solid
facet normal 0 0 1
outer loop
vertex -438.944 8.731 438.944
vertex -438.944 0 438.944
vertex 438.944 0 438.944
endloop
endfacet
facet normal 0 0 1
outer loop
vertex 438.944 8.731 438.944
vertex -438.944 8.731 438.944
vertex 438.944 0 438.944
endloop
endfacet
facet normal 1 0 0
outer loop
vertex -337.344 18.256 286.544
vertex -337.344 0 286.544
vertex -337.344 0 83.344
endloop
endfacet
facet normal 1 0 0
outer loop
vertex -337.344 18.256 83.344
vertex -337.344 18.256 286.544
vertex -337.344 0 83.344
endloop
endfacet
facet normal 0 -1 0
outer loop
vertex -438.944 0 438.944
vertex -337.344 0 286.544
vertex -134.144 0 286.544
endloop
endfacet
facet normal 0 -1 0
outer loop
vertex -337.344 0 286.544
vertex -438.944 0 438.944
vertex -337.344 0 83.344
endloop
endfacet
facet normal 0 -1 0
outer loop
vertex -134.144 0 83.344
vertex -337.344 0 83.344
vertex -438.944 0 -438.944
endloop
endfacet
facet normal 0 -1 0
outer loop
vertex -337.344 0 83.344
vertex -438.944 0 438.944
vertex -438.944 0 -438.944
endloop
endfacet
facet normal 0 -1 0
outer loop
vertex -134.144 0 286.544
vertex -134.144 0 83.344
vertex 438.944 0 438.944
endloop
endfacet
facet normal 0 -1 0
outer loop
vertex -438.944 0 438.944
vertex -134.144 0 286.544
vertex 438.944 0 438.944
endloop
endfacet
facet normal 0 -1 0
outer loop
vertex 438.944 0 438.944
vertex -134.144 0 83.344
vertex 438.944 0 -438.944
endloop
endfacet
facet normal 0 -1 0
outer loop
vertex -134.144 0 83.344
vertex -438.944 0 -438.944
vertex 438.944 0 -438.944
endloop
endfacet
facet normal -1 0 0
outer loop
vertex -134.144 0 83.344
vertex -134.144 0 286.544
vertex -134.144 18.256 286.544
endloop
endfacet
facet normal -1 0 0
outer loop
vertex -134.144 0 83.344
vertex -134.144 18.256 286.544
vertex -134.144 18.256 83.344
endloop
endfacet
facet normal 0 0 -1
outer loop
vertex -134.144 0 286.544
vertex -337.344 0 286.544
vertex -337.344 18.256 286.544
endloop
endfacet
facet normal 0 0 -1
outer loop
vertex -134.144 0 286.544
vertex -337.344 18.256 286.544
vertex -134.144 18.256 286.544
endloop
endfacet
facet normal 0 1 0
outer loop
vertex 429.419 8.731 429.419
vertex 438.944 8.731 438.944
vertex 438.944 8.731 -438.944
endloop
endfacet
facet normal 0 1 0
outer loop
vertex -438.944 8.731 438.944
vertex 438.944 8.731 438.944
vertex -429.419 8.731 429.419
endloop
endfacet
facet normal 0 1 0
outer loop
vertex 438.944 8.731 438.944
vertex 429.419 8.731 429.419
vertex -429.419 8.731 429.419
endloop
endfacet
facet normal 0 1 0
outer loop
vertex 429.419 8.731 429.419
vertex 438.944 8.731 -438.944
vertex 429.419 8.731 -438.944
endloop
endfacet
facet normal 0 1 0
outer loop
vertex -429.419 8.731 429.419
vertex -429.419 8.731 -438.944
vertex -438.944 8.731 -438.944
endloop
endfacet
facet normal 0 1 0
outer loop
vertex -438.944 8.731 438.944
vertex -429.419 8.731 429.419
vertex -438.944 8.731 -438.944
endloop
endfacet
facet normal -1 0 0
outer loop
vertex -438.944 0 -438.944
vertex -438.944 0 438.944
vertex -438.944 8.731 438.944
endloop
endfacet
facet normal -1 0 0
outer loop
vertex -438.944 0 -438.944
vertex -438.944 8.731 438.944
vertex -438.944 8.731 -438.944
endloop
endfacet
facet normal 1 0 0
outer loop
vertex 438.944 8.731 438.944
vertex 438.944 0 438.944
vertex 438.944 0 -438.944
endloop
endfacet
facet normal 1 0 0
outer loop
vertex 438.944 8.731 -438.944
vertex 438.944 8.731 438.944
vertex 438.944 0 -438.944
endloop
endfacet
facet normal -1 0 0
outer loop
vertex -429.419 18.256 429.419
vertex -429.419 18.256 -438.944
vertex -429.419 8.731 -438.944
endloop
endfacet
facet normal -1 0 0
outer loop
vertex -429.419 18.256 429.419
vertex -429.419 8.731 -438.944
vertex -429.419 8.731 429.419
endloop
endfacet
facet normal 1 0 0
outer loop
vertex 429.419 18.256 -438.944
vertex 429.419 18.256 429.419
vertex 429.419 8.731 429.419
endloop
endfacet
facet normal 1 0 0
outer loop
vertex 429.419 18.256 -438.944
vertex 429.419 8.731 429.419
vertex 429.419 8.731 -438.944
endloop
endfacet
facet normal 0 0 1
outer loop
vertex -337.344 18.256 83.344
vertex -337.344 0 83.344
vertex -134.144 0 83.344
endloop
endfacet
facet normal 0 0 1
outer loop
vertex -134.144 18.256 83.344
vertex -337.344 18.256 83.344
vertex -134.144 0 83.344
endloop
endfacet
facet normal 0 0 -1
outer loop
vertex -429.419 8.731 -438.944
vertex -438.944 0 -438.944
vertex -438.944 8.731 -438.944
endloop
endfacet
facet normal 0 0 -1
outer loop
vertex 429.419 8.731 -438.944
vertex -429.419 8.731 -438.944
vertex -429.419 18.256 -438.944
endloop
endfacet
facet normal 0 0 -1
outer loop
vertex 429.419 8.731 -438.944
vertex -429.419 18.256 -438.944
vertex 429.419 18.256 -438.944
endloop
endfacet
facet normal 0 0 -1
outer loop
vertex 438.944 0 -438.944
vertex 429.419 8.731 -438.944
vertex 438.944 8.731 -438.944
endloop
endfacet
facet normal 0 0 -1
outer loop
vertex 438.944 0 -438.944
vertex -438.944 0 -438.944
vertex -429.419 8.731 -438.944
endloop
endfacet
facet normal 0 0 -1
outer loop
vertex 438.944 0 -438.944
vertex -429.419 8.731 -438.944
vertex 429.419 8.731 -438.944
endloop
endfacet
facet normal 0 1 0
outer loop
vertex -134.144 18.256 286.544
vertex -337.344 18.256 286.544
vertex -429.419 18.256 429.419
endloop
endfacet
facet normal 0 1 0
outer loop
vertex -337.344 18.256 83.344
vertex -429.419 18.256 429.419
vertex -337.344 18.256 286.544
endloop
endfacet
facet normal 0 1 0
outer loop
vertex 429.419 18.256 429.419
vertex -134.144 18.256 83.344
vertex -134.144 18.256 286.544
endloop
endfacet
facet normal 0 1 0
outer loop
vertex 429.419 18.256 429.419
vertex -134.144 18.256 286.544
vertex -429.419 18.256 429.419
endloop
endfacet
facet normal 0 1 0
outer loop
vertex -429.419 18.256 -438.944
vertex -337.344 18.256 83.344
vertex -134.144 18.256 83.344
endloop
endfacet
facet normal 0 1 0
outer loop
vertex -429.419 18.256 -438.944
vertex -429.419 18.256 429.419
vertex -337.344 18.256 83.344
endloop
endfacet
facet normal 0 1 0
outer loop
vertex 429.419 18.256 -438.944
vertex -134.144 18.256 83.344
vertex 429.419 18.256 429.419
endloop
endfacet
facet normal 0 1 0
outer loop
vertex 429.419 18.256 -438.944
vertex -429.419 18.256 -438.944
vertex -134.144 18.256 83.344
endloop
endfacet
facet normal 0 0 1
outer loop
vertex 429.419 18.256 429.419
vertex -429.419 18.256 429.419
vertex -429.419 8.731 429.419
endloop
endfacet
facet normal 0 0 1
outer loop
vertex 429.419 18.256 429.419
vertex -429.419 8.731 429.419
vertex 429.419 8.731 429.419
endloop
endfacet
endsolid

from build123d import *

# Parameters (mm, degrees)
SKETCH1_W           = 877.8875
SKETCH1_H           = 877.8875
SKETCH1_W_2         = 203.2
SKETCH1_H_2         = 203.2
BOSS_EXTRUDE1_DEPTH = 18.25625
CUT_EXTRUDE1_DEPTH  = 9.525


with BuildPart() as part:
    # Sketch1 → Boss-Extrude1 (new body)
    with BuildSketch(Plane(origin=(0, 0, 0), x_dir=(1, 0, 0), z_dir=(0, 1, 0))):
        Rectangle(SKETCH1_W, SKETCH1_H)
        with Locations((-235.74375, -184.94375)):
            Rectangle(SKETCH1_W_2, SKETCH1_H_2, mode=Mode.SUBTRACT)
    extrude(amount=BOSS_EXTRUDE1_DEPTH)

    # Sketch3 → Cut-Extrude1 (cut)
    with BuildSketch(Plane(origin=(0, 18.25625, 0), x_dir=(1, 0, 0), z_dir=(0, 1, 0))):
        Polygon((429.41875, 438.94375), (438.94375, 438.94375), (438.94375, -438.94375), (-438.94375, -438.94375), (-438.94375, 438.94375), (-429.41875, 438.94375), (-429.41875, -429.41875), (429.41875, -429.41875), align=None)
    extrude(amount=-CUT_EXTRUDE1_DEPTH, mode=Mode.SUBTRACT)


solid = part.part
